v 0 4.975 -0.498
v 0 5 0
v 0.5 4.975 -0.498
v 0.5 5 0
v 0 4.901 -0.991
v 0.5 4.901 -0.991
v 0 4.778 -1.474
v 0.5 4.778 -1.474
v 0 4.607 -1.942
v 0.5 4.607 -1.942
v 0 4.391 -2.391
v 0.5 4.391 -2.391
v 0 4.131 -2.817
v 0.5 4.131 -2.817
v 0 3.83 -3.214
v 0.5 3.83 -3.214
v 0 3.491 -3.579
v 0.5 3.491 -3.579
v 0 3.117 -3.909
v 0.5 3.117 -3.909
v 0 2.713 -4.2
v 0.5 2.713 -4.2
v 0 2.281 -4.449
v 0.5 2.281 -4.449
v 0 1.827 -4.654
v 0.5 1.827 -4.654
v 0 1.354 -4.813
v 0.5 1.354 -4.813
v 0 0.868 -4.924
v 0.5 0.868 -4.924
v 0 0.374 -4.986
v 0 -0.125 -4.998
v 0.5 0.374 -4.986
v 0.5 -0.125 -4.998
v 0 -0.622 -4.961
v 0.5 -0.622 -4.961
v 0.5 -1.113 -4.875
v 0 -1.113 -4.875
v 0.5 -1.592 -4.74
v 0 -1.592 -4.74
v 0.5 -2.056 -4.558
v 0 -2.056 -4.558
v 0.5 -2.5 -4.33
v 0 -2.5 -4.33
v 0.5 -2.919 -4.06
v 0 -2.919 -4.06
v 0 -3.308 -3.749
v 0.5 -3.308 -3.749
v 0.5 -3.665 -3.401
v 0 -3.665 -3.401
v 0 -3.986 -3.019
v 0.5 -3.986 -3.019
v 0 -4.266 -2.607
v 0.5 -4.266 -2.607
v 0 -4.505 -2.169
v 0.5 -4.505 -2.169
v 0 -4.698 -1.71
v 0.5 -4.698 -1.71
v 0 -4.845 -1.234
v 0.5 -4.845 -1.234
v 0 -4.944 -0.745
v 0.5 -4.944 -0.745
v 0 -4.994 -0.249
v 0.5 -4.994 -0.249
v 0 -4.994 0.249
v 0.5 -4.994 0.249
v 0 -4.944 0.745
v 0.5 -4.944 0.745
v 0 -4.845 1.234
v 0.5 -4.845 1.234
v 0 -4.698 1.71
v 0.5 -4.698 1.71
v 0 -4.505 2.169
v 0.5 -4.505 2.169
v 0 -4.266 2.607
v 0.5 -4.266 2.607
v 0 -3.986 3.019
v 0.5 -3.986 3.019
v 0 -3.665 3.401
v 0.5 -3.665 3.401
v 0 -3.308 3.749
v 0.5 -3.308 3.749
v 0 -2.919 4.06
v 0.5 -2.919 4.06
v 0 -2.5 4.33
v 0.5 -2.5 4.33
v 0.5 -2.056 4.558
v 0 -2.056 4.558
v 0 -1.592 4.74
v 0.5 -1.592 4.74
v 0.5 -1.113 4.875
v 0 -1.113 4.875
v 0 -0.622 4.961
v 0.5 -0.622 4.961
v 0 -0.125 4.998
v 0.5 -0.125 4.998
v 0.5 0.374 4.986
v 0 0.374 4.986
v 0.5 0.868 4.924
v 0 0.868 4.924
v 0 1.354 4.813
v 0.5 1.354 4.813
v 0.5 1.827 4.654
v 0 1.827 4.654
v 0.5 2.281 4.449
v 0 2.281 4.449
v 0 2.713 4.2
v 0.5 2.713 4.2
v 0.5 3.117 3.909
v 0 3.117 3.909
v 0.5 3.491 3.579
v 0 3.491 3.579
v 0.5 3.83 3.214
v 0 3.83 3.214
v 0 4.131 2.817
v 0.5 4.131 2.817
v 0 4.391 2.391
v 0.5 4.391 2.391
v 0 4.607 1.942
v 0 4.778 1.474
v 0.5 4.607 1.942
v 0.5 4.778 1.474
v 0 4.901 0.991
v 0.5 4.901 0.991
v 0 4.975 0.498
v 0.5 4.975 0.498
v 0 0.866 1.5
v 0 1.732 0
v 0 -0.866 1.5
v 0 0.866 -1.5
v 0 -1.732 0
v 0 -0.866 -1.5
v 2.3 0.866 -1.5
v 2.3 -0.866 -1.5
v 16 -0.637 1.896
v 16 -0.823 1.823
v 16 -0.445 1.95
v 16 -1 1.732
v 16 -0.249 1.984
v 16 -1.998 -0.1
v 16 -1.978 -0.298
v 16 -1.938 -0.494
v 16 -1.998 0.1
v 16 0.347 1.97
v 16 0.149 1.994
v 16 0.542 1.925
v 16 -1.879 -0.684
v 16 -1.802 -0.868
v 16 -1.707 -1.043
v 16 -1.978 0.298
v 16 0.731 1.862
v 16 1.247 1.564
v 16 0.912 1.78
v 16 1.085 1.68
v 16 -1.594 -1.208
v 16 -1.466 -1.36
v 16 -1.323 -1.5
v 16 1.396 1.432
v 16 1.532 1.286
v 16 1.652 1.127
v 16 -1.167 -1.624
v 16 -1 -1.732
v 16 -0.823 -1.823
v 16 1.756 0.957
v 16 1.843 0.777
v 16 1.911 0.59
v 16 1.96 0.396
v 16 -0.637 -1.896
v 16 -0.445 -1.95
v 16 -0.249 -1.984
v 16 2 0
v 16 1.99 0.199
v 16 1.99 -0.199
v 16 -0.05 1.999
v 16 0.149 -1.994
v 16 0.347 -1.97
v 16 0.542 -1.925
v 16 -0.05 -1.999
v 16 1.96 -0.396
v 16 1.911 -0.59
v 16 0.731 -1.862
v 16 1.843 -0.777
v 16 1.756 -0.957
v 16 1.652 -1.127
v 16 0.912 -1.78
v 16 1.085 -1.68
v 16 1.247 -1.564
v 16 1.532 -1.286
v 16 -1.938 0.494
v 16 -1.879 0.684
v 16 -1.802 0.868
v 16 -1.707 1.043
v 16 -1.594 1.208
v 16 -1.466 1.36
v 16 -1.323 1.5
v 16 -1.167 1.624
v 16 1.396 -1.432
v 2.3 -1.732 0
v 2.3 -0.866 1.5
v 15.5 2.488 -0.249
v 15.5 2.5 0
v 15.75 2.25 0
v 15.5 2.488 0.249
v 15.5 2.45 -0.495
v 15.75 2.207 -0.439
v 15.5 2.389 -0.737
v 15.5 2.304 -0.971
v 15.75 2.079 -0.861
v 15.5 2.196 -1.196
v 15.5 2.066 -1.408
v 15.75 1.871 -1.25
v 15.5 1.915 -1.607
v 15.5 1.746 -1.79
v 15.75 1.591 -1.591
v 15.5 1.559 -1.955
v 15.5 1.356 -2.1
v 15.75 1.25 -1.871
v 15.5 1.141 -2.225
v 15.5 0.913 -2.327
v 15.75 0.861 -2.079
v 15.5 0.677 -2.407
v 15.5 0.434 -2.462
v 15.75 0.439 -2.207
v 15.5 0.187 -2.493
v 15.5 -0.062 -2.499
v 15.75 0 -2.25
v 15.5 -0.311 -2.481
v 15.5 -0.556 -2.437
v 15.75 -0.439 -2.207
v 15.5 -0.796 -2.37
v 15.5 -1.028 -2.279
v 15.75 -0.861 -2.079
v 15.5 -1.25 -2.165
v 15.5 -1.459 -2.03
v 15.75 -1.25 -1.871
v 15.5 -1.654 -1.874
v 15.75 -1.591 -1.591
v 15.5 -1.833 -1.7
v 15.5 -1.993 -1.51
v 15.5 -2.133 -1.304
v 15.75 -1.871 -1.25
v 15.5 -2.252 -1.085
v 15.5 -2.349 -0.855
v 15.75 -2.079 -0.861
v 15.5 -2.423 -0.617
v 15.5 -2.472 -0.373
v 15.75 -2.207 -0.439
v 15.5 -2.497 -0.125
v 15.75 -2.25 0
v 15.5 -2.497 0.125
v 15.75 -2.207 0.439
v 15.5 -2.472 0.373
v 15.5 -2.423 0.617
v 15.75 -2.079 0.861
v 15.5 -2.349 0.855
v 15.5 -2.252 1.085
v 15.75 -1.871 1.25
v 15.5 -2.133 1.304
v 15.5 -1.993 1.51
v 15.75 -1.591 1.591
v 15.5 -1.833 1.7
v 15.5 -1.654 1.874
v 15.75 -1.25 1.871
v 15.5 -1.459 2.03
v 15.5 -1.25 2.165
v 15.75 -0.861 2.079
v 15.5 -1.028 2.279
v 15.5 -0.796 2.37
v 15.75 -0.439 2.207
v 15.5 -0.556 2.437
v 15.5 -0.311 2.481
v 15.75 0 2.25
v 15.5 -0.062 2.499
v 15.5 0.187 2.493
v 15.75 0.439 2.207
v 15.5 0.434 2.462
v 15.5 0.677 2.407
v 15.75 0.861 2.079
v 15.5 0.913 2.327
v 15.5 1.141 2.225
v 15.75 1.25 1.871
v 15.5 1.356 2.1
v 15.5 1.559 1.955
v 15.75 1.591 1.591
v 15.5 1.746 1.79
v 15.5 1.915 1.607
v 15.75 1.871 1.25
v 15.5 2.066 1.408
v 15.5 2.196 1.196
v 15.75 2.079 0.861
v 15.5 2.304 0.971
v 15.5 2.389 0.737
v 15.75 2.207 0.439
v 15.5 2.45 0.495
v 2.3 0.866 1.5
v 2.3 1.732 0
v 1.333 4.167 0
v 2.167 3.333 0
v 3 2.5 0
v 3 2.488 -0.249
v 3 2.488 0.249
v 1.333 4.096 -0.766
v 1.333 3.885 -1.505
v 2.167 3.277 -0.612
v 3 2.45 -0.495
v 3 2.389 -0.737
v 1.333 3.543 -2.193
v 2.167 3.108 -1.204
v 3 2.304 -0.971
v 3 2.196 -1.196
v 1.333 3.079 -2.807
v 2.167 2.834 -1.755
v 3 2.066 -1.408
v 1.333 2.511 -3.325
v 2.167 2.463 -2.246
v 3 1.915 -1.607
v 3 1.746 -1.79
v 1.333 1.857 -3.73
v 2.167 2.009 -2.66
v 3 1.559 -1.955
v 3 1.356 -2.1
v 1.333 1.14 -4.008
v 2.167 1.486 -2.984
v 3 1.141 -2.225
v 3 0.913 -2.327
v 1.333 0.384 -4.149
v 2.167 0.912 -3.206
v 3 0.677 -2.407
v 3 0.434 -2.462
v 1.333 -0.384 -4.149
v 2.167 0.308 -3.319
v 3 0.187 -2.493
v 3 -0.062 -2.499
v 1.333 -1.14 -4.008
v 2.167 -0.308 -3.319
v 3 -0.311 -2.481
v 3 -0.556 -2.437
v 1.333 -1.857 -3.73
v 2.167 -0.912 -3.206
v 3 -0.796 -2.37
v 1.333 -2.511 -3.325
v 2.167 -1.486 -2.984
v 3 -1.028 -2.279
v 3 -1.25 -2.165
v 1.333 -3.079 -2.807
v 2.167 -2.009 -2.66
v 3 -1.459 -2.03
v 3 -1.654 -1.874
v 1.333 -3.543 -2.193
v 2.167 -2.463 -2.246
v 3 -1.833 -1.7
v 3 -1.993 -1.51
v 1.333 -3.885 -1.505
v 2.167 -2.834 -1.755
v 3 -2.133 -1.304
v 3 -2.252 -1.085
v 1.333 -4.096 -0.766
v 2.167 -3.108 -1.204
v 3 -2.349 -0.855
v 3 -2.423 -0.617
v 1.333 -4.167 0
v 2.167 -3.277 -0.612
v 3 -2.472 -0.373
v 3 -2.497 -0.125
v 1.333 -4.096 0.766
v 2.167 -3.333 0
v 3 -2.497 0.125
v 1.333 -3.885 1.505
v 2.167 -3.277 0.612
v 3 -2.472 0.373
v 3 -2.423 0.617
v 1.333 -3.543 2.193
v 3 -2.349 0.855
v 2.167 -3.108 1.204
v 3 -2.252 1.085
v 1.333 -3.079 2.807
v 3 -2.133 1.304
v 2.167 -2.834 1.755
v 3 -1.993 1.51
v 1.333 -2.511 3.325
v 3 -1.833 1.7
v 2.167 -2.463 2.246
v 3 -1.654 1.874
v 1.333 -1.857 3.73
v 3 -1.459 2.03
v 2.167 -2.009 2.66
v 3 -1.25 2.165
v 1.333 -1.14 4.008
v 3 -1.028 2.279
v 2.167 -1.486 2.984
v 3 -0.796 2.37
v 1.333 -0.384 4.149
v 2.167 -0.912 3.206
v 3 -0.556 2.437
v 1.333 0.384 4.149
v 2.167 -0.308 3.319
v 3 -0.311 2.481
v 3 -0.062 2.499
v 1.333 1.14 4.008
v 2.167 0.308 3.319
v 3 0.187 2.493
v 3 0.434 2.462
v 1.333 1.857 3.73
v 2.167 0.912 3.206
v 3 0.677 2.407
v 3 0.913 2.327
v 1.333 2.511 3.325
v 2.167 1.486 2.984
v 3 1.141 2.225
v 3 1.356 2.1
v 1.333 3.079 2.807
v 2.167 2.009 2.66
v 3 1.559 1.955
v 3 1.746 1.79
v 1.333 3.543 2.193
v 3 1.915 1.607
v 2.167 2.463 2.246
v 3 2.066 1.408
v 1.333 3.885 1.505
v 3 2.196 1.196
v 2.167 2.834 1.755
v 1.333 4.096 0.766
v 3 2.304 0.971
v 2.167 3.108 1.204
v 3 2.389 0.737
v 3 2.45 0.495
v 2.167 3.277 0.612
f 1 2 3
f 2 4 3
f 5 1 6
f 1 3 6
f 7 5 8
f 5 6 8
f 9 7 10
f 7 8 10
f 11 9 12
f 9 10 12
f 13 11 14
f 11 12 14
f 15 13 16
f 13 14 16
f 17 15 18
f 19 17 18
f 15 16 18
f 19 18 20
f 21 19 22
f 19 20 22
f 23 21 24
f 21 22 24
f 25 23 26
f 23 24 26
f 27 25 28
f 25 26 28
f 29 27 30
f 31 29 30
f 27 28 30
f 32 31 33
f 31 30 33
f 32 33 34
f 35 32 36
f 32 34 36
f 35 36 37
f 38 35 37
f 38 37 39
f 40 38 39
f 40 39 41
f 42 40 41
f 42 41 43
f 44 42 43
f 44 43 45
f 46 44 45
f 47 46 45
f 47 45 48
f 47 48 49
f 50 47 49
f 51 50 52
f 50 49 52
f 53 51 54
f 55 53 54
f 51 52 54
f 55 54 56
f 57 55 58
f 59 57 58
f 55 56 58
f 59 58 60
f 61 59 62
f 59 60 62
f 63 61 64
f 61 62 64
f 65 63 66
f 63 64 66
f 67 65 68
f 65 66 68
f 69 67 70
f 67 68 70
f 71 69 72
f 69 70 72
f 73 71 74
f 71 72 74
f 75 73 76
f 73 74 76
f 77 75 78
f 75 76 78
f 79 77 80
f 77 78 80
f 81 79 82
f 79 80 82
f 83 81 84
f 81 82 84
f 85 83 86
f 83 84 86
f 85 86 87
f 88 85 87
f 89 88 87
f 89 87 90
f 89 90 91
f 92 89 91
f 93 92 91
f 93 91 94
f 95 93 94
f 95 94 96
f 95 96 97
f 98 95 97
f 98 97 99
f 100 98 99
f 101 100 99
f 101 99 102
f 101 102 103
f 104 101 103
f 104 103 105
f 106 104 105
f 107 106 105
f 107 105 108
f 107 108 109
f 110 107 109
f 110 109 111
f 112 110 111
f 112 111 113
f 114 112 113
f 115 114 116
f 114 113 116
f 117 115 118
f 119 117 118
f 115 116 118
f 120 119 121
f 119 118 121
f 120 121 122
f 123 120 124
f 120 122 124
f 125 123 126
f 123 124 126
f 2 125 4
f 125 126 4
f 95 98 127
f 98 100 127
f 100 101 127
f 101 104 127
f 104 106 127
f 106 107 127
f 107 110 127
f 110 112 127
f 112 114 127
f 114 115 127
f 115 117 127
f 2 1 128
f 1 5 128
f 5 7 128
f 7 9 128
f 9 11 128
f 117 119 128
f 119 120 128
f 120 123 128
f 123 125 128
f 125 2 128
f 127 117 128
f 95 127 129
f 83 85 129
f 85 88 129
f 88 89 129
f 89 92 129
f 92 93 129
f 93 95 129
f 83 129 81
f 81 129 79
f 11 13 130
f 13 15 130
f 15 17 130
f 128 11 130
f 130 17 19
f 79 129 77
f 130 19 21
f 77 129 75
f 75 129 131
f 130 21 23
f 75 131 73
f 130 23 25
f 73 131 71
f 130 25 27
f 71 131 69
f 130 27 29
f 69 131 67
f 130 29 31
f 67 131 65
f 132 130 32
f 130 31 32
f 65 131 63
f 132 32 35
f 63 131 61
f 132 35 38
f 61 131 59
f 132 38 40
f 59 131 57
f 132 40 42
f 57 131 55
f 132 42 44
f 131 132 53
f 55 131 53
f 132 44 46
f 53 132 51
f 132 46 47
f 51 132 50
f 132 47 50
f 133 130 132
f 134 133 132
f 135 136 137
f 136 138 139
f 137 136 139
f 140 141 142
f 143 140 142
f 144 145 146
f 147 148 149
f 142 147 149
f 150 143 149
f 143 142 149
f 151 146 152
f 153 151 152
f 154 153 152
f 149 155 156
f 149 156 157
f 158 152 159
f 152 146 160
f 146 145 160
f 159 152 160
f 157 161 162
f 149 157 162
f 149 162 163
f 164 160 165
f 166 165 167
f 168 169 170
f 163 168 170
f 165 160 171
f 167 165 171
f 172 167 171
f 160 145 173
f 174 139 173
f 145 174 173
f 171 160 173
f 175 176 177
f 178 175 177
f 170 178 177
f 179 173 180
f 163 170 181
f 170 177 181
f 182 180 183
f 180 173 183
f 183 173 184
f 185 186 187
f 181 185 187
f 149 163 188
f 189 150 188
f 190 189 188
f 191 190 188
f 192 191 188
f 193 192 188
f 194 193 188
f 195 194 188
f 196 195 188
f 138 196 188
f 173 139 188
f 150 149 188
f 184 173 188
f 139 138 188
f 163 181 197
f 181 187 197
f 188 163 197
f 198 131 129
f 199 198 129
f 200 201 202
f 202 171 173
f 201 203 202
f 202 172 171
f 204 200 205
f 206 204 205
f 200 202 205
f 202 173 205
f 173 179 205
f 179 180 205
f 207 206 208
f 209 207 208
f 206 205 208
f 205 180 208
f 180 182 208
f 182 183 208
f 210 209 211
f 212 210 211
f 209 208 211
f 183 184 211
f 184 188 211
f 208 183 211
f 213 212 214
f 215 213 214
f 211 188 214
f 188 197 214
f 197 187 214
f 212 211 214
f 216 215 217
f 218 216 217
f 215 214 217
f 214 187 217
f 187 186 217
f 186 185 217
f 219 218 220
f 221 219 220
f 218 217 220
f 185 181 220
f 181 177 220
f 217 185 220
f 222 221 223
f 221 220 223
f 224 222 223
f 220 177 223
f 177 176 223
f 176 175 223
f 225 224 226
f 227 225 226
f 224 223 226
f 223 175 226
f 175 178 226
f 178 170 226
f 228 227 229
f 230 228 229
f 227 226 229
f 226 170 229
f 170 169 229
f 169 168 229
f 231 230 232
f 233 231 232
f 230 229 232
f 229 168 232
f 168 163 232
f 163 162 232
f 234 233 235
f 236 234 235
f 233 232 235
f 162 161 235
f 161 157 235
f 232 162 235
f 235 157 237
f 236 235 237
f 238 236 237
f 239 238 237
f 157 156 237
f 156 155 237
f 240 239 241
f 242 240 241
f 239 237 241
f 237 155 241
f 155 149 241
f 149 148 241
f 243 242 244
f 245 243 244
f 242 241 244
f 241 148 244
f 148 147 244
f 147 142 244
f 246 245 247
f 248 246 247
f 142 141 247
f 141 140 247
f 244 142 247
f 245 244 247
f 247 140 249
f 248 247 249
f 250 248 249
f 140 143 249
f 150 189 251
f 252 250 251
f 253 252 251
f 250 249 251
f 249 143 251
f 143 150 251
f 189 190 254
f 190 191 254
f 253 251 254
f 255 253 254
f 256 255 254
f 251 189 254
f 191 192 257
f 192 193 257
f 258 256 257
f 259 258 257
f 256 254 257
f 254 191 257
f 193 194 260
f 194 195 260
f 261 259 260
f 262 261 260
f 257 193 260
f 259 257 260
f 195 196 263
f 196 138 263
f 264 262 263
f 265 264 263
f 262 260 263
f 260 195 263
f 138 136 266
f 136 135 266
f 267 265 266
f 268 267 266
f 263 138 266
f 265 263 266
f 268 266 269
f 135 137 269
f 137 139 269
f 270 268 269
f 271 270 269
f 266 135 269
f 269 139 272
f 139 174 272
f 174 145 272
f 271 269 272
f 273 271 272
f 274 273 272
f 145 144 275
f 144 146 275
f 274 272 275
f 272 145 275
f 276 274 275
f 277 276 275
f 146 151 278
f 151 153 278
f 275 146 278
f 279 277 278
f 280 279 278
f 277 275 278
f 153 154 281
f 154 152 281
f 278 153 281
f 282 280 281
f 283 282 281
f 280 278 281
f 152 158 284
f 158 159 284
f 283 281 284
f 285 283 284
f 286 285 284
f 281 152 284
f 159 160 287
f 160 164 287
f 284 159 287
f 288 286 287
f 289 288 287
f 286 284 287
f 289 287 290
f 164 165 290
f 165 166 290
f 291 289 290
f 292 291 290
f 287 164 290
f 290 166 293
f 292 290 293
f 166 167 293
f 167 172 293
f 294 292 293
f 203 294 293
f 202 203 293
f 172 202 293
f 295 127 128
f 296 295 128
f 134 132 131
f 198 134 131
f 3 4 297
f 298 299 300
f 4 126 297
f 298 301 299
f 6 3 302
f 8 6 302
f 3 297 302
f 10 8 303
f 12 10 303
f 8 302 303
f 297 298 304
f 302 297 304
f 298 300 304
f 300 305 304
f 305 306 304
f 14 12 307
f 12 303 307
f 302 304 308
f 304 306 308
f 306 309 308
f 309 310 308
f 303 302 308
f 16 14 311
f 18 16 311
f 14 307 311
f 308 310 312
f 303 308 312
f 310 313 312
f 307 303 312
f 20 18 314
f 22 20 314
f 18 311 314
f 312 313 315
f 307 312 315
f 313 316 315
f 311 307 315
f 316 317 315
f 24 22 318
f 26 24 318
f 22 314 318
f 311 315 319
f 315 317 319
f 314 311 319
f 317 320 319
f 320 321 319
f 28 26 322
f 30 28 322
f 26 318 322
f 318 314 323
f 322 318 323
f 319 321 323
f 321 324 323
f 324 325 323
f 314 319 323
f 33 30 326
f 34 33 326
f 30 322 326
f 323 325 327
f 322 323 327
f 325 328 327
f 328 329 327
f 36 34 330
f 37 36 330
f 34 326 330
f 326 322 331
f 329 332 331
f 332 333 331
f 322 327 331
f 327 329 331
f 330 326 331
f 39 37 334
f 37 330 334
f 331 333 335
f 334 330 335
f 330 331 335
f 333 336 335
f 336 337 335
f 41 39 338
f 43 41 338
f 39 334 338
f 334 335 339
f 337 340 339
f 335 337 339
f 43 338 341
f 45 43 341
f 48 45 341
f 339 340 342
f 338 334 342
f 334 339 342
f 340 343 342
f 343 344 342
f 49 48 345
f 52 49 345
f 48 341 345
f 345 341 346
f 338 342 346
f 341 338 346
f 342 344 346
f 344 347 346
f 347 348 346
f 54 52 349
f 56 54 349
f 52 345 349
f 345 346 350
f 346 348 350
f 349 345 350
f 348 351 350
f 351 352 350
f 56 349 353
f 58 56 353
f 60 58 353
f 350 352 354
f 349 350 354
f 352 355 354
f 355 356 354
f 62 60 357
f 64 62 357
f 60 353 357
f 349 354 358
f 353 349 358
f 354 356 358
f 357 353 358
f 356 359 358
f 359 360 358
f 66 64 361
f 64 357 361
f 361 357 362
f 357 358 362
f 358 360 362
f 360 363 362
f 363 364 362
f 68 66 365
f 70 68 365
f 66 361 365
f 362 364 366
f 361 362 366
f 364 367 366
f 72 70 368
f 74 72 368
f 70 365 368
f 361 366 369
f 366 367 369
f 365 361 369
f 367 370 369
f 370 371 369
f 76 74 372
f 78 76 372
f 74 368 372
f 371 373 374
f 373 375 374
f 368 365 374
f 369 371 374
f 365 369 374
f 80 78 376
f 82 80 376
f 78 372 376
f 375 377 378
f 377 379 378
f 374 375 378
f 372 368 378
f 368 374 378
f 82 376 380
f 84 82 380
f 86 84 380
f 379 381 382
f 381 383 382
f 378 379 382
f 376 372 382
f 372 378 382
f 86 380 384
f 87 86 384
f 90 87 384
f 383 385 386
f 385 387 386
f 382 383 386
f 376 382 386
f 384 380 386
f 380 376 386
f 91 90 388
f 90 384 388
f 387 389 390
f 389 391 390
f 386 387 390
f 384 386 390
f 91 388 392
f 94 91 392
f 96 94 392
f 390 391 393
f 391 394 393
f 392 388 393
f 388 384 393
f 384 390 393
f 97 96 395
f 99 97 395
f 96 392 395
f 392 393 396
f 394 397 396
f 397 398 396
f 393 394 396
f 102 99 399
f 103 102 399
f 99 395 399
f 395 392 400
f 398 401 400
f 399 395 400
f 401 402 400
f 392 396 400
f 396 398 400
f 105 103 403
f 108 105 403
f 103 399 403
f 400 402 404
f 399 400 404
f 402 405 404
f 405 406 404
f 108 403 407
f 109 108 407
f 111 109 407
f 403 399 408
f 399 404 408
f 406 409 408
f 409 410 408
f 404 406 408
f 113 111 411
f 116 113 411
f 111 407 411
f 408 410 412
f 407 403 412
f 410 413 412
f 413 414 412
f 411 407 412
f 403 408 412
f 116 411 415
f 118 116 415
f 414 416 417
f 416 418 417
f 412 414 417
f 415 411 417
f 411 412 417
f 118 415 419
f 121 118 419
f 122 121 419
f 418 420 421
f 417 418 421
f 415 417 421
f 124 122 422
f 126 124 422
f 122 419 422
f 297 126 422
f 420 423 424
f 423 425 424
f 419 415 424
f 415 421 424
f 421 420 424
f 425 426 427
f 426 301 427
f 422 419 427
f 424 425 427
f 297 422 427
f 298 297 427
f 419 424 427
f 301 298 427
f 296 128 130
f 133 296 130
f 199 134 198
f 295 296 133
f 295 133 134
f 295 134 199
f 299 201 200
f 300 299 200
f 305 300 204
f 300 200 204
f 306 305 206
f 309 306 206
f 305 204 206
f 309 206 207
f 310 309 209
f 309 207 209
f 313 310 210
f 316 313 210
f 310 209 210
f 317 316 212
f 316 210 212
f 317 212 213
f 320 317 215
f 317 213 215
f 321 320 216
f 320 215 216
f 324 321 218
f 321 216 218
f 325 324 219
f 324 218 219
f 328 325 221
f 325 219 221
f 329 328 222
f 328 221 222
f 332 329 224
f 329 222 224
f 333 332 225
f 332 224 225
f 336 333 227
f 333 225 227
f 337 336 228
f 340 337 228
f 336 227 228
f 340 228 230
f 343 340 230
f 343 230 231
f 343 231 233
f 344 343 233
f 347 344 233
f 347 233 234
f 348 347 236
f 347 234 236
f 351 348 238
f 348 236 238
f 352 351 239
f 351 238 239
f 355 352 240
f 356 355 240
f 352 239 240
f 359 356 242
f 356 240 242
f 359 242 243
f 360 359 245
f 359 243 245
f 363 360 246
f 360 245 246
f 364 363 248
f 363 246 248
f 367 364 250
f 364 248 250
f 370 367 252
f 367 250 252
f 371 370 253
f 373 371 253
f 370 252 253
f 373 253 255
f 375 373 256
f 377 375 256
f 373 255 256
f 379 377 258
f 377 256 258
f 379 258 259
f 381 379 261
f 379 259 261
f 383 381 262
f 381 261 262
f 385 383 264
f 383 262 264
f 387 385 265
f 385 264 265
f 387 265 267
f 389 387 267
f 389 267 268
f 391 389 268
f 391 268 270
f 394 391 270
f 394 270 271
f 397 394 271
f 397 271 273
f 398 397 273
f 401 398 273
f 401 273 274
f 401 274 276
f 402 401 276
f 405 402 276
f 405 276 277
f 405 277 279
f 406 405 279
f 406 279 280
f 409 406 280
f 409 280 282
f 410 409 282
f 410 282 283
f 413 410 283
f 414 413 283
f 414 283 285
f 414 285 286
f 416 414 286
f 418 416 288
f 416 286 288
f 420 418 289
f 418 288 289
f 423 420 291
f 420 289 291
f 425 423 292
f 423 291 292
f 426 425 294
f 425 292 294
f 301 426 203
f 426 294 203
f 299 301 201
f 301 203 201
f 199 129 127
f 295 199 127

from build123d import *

# Parameters (mm, degrees)
CHANFREIN1_SIZE         = 0.5
ENL_V_MAT_EXTRU_1_DEPTH = 2.3


with BuildPart() as part:
    # Esquisse1 → Révolution1 (revolve)
    with BuildSketch(Plane.XY):
        Polygon((0, 0), (0, 5), (0.5, 5), (3, 2.5), (16, 2.5), (16, 0), align=None)
    revolve(axis=Axis((16, 0, 0), (-1, 0, 0)))

    # Chanfrein1
    chanfrein1_edges = [part.edges().sort_by_distance(p)[0] for p in [
        (16, -2.5, 0),
    ]]
    chamfer(chanfrein1_edges, length=CHANFREIN1_SIZE)

    # Esquisse2 → Enlèv. mat.-Extru.1 (cut)
    with BuildSketch(Plane.ZY):
        Polygon((0, 1.732050808), (-1.5, 0.866025404), (-1.5, -0.866025404), (0, -1.732050808), (1.5, -0.866025404), (1.5, 0.866025404), align=None)
    extrude(amount=-ENL_V_MAT_EXTRU_1_DEPTH, mode=Mode.SUBTRACT)


solid = part.part
